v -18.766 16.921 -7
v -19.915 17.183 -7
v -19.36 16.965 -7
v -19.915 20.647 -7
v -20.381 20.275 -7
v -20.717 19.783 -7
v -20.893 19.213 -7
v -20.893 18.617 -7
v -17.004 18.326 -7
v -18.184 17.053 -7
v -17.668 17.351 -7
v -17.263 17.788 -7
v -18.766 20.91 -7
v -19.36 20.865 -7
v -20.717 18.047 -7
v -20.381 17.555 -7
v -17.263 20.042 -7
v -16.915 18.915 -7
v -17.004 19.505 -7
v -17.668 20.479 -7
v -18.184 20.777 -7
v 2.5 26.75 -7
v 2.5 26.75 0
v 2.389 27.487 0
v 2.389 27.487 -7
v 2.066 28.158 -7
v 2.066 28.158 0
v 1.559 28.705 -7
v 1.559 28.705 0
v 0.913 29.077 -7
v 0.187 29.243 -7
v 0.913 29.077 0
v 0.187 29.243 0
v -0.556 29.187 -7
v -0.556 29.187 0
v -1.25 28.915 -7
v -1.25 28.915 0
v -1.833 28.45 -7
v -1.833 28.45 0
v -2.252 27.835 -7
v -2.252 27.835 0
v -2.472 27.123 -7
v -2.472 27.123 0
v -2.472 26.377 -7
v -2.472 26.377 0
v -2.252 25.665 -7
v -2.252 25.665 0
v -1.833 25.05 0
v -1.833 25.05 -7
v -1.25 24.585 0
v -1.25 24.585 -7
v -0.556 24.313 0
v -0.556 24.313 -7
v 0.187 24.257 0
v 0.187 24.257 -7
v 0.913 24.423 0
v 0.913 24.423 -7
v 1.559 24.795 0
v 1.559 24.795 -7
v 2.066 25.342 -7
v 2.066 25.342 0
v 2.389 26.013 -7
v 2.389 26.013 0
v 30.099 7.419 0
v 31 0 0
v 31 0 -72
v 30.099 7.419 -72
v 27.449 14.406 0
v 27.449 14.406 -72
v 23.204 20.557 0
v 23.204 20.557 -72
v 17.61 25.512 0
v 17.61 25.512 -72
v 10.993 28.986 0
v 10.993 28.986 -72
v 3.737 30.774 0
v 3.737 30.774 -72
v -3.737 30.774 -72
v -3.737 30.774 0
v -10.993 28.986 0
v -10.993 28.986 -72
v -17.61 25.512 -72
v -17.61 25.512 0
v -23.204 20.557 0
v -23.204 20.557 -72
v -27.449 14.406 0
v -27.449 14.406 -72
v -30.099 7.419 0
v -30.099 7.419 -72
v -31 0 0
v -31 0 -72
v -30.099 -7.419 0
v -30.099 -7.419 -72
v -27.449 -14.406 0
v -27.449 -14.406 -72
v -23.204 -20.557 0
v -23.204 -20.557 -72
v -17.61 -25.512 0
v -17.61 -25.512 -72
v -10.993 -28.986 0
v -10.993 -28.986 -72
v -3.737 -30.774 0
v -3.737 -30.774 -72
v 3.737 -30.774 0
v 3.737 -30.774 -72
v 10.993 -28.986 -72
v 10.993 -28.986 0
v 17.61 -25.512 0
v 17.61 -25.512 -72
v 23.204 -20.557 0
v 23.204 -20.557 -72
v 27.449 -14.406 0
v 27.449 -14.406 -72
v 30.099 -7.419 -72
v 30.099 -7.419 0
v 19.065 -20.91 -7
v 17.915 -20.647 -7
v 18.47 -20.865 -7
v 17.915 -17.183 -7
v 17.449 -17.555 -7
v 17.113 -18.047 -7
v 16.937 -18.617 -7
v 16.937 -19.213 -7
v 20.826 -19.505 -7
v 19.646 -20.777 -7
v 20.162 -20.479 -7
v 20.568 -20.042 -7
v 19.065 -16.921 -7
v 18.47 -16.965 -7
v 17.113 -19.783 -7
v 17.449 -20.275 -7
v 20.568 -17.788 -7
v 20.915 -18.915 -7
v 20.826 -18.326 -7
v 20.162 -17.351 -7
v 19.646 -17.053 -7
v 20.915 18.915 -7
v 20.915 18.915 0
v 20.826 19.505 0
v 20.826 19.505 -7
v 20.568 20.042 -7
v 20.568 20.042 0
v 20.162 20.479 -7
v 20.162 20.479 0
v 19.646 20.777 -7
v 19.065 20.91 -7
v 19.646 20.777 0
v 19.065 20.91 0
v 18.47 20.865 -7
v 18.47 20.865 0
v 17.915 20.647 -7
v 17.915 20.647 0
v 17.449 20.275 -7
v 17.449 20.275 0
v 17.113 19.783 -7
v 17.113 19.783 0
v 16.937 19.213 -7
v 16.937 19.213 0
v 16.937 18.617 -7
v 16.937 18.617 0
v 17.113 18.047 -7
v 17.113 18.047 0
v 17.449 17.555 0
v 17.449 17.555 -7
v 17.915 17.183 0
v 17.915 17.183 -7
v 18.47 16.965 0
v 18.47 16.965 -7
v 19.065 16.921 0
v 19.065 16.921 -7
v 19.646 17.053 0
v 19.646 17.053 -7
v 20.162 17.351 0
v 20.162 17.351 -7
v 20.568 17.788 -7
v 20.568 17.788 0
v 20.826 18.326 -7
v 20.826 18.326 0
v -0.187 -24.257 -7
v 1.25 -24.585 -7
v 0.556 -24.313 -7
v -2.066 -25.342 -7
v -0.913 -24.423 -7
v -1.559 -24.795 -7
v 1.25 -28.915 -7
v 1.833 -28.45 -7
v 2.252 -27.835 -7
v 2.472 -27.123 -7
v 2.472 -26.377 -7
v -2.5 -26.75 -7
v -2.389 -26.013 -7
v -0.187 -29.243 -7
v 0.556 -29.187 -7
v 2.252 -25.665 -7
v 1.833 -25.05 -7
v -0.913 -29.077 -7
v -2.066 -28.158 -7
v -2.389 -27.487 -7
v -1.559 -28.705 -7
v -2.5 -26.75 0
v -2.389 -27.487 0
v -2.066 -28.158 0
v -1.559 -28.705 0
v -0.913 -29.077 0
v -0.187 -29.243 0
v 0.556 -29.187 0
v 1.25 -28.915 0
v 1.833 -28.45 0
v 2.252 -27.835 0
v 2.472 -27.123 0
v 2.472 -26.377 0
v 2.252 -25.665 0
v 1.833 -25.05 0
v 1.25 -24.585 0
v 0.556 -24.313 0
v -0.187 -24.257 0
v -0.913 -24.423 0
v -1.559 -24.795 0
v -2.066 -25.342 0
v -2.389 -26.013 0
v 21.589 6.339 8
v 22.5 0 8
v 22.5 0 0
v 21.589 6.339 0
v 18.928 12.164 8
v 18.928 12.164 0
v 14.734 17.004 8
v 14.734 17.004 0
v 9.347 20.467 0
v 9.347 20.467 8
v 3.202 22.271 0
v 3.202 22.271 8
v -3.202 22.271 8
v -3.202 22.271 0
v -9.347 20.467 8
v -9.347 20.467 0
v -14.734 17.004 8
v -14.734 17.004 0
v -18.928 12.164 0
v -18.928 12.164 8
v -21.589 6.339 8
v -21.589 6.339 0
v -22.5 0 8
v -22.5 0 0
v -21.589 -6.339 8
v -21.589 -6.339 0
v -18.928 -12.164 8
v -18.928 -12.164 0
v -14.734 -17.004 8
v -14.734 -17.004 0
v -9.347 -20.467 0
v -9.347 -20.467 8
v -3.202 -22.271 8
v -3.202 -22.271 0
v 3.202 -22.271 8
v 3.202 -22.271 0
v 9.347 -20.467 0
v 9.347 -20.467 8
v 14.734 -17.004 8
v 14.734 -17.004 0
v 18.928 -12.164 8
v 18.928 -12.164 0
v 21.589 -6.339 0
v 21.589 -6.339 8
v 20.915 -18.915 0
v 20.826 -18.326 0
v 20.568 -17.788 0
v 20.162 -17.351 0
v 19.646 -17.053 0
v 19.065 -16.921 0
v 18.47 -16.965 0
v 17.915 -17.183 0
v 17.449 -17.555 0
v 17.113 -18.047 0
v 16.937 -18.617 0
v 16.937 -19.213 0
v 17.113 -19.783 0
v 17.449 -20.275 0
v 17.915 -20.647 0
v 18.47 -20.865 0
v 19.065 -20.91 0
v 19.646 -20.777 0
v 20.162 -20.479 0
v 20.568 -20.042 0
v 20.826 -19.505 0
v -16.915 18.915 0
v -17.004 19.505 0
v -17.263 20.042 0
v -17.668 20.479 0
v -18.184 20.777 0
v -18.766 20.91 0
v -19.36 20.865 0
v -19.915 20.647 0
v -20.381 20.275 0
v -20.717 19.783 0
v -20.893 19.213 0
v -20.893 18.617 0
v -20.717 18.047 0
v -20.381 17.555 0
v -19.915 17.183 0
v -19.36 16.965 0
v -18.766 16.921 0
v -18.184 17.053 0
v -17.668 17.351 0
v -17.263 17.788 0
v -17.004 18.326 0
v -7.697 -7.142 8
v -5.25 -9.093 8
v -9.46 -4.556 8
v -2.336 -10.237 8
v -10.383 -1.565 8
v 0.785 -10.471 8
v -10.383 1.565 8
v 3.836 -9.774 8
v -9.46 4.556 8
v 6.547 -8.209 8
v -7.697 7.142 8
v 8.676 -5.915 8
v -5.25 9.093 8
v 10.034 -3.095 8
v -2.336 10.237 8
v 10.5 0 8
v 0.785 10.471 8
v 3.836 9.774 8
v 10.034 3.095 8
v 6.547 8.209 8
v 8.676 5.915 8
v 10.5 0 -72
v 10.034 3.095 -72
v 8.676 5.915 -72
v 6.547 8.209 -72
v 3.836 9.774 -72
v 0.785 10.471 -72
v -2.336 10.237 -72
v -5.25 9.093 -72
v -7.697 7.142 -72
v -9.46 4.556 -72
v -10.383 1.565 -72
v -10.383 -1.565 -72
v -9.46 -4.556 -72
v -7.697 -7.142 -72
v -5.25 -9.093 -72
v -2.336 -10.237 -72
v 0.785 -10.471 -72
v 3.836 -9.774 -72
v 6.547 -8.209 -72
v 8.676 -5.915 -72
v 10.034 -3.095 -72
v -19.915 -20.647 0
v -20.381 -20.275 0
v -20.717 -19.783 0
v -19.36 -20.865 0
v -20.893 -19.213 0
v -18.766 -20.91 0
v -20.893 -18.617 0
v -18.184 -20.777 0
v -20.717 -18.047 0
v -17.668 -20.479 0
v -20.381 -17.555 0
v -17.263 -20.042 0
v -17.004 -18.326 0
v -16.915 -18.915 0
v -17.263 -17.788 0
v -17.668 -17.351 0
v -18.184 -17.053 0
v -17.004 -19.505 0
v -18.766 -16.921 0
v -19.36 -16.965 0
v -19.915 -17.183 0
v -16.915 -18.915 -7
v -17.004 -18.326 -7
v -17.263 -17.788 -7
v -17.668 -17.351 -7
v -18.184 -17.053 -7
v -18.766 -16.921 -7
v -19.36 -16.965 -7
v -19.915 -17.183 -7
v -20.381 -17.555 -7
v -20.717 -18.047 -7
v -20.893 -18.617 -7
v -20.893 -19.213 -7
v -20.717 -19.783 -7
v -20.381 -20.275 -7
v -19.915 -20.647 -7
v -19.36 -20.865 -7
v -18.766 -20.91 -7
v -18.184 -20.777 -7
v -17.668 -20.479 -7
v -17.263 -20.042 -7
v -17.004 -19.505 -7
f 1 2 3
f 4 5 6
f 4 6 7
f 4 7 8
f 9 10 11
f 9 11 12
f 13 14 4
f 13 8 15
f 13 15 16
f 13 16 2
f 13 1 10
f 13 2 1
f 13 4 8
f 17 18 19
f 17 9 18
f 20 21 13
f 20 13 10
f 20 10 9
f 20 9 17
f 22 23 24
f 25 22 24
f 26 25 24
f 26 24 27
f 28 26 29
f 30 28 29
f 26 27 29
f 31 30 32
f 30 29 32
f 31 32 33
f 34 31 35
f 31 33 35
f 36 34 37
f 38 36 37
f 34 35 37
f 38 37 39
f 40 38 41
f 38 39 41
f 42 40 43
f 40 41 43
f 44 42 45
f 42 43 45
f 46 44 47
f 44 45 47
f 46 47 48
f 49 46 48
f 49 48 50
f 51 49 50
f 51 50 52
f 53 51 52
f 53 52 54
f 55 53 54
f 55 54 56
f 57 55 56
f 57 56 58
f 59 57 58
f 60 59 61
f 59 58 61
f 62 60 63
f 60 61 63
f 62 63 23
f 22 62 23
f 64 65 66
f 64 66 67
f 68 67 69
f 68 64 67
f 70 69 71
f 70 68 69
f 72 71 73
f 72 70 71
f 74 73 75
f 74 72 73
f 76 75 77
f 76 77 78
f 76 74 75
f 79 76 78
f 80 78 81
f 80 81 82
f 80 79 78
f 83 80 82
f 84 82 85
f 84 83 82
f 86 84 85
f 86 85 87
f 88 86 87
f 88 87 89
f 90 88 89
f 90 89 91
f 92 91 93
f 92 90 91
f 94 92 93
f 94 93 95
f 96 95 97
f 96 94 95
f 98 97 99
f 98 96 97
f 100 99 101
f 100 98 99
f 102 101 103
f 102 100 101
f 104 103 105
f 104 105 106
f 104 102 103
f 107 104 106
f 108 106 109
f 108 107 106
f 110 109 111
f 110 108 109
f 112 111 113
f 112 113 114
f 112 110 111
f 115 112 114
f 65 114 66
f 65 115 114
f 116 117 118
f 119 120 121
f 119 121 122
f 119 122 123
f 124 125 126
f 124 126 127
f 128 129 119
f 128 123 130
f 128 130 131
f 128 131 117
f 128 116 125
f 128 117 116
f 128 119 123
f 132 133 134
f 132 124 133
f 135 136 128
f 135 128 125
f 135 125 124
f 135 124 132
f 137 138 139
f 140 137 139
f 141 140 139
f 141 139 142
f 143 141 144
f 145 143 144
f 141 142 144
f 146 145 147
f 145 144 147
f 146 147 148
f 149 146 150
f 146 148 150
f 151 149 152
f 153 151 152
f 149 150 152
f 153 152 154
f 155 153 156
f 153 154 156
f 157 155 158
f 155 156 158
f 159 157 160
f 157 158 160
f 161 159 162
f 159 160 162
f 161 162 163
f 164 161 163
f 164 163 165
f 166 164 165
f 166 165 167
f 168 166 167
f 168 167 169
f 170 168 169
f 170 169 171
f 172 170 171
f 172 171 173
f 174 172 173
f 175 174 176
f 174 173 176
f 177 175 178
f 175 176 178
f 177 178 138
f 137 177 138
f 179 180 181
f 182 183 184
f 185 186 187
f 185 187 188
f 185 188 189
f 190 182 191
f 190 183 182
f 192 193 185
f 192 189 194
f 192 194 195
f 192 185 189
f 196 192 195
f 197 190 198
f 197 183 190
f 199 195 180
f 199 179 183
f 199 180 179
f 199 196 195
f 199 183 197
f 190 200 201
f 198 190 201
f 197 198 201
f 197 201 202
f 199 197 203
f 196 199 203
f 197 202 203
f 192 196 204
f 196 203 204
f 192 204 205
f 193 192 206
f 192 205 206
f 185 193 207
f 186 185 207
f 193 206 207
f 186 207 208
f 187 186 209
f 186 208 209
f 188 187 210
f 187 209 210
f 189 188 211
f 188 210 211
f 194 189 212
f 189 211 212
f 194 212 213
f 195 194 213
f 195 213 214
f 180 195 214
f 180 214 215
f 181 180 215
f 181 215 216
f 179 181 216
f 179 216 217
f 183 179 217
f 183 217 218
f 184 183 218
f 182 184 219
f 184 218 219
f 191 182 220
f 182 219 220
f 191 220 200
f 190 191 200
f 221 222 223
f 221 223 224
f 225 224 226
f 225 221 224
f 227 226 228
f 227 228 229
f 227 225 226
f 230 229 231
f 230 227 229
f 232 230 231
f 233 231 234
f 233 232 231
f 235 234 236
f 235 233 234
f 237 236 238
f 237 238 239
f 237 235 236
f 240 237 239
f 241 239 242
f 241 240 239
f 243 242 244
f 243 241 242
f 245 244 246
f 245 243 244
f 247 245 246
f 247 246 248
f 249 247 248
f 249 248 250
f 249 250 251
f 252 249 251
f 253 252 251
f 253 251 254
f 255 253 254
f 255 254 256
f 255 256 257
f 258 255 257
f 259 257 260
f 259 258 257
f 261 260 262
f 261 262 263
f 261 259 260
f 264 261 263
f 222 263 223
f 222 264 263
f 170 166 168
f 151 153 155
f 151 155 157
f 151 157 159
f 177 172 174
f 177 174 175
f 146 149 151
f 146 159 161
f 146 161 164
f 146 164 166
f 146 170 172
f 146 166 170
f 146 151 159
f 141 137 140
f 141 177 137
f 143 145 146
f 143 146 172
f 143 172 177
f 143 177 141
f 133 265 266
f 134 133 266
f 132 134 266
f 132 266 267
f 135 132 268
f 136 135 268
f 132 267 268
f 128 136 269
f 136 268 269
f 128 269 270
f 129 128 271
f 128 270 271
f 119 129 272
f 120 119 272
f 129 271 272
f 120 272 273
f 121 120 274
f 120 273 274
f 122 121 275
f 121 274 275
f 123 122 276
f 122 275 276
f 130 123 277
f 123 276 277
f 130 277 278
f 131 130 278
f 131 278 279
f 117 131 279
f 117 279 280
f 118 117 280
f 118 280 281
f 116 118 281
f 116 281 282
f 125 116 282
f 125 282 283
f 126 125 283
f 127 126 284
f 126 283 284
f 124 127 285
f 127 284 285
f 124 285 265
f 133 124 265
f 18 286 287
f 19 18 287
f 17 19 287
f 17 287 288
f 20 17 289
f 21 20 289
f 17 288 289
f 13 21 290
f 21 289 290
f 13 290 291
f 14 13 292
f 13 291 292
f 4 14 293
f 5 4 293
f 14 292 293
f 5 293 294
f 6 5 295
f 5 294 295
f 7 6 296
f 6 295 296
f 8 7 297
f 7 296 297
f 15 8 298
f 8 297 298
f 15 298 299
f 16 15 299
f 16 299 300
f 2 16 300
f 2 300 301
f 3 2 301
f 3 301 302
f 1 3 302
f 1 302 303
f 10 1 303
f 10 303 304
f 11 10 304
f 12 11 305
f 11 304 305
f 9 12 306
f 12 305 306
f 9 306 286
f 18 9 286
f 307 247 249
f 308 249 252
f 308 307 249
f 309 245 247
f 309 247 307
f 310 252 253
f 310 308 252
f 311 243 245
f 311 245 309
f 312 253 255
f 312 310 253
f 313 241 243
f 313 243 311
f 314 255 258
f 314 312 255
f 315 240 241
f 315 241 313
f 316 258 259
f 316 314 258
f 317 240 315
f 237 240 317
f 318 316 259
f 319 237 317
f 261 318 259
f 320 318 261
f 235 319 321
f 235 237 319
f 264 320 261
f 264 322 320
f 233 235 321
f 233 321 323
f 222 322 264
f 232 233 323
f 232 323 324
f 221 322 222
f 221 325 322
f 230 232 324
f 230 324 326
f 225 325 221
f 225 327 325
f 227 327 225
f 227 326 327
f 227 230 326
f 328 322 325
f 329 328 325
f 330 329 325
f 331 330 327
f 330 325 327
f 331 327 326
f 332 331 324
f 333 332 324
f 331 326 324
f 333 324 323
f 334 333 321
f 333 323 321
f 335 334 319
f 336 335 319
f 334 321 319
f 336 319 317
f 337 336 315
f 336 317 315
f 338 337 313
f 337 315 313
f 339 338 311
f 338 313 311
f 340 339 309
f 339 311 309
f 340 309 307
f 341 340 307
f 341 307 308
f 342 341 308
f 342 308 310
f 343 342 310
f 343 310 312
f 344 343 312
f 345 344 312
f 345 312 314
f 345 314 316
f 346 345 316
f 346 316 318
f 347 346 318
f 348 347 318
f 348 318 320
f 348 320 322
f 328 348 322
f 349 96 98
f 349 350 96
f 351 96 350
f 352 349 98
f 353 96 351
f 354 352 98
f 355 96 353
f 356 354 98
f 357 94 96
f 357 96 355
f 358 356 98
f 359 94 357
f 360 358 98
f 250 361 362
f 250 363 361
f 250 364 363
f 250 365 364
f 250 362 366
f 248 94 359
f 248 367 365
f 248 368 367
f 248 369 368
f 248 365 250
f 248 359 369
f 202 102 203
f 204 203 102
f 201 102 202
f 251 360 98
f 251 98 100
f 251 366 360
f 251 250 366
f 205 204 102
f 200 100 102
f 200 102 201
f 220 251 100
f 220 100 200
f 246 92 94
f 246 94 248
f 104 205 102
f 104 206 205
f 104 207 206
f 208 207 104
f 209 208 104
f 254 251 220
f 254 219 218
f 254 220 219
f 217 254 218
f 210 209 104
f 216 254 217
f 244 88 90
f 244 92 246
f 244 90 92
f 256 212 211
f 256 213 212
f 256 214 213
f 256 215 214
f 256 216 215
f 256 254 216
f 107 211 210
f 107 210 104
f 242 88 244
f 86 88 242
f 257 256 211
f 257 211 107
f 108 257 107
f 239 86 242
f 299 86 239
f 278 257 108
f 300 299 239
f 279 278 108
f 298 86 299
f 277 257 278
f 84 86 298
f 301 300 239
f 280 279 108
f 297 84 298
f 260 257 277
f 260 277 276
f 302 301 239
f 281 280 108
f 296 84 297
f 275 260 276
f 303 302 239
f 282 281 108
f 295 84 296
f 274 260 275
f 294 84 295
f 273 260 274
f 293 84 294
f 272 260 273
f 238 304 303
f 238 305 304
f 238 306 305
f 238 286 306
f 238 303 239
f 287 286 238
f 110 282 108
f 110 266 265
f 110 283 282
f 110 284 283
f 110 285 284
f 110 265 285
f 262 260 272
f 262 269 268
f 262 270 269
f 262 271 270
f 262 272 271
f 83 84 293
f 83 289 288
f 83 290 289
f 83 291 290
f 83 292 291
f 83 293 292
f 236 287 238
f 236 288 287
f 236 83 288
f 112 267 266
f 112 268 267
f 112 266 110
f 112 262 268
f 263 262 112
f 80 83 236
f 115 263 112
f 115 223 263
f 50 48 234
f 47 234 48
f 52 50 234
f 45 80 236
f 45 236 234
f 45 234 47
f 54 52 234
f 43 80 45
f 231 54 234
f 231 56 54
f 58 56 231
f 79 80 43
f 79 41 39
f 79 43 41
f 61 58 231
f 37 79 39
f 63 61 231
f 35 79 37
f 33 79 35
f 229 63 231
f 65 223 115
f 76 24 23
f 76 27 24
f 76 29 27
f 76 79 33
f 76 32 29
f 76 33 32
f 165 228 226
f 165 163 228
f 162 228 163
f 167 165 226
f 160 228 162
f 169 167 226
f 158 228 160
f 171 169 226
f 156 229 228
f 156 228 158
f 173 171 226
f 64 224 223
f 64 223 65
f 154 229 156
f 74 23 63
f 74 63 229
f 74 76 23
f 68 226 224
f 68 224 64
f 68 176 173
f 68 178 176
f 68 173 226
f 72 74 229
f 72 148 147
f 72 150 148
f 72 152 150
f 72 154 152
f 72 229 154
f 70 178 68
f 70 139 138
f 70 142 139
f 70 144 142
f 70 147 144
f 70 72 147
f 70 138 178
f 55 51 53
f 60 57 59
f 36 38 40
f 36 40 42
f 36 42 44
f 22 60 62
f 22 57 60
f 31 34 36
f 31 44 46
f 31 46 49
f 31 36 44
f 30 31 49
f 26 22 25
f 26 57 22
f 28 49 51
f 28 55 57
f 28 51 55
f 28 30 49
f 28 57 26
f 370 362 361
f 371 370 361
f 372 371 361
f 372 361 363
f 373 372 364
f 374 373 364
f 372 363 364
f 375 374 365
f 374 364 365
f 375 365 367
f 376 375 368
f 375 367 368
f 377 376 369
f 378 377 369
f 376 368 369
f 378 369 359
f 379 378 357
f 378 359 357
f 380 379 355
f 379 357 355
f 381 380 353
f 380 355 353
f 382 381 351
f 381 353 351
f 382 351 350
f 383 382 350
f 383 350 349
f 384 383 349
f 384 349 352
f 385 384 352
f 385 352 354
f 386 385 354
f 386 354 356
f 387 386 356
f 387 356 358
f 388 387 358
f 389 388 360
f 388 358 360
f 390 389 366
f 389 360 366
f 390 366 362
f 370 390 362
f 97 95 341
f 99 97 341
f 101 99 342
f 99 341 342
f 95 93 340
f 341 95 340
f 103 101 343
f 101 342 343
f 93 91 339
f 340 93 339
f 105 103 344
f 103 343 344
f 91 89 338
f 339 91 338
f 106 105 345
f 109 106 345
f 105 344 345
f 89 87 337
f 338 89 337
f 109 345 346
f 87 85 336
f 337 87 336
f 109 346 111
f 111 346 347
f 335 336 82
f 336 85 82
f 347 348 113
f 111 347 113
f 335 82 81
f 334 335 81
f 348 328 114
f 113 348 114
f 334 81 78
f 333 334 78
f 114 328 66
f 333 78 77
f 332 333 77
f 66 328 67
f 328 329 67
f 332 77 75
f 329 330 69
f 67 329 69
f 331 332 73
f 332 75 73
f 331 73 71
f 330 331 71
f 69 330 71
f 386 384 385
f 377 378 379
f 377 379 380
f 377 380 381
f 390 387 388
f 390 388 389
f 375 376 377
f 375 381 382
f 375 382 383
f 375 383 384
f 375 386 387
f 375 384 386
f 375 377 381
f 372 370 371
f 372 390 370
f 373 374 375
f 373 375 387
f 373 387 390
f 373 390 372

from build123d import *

# Parameters (mm, degrees)
SKETCH_1_R          = 31
SKETCH_1_R_2        = 10.5
EXTRUDE_1_DEPTH     = 72
EXTRUDE_START       = 8
SKETCH_1_3_R        = 22.5
SKETCH_1_3_R_2      = 10.5
EXTRUDE_2_DEPTH     = 8
SKETCH_2_R          = 2.5
SKETCH_2_R_2        = 2
CUT_EXTRUDE_3_DEPTH = 7


with BuildPart() as part:
    # 草图1 → 凸台-拉伸1 (new body)
    with BuildSketch(Plane.XY):
        Circle(SKETCH_1_R)
        Circle(SKETCH_1_R_2, mode=Mode.SUBTRACT)
    extrude(amount=-EXTRUDE_1_DEPTH)

    # 草图1<3> → 凸台-拉伸2 (add)
    with BuildSketch(Plane.XY.offset(EXTRUDE_START)):
        Circle(SKETCH_1_3_R)
        Circle(SKETCH_1_3_R_2, mode=Mode.SUBTRACT)
    extrude(amount=-EXTRUDE_2_DEPTH)

    # 草图2 → 切除-拉伸3 (cut)
    with BuildSketch(Plane.XY):
        with Locations((0, 26.75)):
            Circle(SKETCH_2_R)
        with Locations((18.915106397, 18.915106397)):
            Circle(SKETCH_2_R_2)
        with Locations((0, -26.75)):
            Circle(SKETCH_2_R)
        with Locations((18.915106397, -18.915106397)):
            Circle(SKETCH_2_R_2)
        with Locations((-18.915106397, -18.915106397)):
            Circle(SKETCH_2_R_2)
        with Locations((-18.915106397, 18.915106397)):
            Circle(SKETCH_2_R_2)
    extrude(amount=-CUT_EXTRUDE_3_DEPTH, mode=Mode.SUBTRACT)


solid = part.part
